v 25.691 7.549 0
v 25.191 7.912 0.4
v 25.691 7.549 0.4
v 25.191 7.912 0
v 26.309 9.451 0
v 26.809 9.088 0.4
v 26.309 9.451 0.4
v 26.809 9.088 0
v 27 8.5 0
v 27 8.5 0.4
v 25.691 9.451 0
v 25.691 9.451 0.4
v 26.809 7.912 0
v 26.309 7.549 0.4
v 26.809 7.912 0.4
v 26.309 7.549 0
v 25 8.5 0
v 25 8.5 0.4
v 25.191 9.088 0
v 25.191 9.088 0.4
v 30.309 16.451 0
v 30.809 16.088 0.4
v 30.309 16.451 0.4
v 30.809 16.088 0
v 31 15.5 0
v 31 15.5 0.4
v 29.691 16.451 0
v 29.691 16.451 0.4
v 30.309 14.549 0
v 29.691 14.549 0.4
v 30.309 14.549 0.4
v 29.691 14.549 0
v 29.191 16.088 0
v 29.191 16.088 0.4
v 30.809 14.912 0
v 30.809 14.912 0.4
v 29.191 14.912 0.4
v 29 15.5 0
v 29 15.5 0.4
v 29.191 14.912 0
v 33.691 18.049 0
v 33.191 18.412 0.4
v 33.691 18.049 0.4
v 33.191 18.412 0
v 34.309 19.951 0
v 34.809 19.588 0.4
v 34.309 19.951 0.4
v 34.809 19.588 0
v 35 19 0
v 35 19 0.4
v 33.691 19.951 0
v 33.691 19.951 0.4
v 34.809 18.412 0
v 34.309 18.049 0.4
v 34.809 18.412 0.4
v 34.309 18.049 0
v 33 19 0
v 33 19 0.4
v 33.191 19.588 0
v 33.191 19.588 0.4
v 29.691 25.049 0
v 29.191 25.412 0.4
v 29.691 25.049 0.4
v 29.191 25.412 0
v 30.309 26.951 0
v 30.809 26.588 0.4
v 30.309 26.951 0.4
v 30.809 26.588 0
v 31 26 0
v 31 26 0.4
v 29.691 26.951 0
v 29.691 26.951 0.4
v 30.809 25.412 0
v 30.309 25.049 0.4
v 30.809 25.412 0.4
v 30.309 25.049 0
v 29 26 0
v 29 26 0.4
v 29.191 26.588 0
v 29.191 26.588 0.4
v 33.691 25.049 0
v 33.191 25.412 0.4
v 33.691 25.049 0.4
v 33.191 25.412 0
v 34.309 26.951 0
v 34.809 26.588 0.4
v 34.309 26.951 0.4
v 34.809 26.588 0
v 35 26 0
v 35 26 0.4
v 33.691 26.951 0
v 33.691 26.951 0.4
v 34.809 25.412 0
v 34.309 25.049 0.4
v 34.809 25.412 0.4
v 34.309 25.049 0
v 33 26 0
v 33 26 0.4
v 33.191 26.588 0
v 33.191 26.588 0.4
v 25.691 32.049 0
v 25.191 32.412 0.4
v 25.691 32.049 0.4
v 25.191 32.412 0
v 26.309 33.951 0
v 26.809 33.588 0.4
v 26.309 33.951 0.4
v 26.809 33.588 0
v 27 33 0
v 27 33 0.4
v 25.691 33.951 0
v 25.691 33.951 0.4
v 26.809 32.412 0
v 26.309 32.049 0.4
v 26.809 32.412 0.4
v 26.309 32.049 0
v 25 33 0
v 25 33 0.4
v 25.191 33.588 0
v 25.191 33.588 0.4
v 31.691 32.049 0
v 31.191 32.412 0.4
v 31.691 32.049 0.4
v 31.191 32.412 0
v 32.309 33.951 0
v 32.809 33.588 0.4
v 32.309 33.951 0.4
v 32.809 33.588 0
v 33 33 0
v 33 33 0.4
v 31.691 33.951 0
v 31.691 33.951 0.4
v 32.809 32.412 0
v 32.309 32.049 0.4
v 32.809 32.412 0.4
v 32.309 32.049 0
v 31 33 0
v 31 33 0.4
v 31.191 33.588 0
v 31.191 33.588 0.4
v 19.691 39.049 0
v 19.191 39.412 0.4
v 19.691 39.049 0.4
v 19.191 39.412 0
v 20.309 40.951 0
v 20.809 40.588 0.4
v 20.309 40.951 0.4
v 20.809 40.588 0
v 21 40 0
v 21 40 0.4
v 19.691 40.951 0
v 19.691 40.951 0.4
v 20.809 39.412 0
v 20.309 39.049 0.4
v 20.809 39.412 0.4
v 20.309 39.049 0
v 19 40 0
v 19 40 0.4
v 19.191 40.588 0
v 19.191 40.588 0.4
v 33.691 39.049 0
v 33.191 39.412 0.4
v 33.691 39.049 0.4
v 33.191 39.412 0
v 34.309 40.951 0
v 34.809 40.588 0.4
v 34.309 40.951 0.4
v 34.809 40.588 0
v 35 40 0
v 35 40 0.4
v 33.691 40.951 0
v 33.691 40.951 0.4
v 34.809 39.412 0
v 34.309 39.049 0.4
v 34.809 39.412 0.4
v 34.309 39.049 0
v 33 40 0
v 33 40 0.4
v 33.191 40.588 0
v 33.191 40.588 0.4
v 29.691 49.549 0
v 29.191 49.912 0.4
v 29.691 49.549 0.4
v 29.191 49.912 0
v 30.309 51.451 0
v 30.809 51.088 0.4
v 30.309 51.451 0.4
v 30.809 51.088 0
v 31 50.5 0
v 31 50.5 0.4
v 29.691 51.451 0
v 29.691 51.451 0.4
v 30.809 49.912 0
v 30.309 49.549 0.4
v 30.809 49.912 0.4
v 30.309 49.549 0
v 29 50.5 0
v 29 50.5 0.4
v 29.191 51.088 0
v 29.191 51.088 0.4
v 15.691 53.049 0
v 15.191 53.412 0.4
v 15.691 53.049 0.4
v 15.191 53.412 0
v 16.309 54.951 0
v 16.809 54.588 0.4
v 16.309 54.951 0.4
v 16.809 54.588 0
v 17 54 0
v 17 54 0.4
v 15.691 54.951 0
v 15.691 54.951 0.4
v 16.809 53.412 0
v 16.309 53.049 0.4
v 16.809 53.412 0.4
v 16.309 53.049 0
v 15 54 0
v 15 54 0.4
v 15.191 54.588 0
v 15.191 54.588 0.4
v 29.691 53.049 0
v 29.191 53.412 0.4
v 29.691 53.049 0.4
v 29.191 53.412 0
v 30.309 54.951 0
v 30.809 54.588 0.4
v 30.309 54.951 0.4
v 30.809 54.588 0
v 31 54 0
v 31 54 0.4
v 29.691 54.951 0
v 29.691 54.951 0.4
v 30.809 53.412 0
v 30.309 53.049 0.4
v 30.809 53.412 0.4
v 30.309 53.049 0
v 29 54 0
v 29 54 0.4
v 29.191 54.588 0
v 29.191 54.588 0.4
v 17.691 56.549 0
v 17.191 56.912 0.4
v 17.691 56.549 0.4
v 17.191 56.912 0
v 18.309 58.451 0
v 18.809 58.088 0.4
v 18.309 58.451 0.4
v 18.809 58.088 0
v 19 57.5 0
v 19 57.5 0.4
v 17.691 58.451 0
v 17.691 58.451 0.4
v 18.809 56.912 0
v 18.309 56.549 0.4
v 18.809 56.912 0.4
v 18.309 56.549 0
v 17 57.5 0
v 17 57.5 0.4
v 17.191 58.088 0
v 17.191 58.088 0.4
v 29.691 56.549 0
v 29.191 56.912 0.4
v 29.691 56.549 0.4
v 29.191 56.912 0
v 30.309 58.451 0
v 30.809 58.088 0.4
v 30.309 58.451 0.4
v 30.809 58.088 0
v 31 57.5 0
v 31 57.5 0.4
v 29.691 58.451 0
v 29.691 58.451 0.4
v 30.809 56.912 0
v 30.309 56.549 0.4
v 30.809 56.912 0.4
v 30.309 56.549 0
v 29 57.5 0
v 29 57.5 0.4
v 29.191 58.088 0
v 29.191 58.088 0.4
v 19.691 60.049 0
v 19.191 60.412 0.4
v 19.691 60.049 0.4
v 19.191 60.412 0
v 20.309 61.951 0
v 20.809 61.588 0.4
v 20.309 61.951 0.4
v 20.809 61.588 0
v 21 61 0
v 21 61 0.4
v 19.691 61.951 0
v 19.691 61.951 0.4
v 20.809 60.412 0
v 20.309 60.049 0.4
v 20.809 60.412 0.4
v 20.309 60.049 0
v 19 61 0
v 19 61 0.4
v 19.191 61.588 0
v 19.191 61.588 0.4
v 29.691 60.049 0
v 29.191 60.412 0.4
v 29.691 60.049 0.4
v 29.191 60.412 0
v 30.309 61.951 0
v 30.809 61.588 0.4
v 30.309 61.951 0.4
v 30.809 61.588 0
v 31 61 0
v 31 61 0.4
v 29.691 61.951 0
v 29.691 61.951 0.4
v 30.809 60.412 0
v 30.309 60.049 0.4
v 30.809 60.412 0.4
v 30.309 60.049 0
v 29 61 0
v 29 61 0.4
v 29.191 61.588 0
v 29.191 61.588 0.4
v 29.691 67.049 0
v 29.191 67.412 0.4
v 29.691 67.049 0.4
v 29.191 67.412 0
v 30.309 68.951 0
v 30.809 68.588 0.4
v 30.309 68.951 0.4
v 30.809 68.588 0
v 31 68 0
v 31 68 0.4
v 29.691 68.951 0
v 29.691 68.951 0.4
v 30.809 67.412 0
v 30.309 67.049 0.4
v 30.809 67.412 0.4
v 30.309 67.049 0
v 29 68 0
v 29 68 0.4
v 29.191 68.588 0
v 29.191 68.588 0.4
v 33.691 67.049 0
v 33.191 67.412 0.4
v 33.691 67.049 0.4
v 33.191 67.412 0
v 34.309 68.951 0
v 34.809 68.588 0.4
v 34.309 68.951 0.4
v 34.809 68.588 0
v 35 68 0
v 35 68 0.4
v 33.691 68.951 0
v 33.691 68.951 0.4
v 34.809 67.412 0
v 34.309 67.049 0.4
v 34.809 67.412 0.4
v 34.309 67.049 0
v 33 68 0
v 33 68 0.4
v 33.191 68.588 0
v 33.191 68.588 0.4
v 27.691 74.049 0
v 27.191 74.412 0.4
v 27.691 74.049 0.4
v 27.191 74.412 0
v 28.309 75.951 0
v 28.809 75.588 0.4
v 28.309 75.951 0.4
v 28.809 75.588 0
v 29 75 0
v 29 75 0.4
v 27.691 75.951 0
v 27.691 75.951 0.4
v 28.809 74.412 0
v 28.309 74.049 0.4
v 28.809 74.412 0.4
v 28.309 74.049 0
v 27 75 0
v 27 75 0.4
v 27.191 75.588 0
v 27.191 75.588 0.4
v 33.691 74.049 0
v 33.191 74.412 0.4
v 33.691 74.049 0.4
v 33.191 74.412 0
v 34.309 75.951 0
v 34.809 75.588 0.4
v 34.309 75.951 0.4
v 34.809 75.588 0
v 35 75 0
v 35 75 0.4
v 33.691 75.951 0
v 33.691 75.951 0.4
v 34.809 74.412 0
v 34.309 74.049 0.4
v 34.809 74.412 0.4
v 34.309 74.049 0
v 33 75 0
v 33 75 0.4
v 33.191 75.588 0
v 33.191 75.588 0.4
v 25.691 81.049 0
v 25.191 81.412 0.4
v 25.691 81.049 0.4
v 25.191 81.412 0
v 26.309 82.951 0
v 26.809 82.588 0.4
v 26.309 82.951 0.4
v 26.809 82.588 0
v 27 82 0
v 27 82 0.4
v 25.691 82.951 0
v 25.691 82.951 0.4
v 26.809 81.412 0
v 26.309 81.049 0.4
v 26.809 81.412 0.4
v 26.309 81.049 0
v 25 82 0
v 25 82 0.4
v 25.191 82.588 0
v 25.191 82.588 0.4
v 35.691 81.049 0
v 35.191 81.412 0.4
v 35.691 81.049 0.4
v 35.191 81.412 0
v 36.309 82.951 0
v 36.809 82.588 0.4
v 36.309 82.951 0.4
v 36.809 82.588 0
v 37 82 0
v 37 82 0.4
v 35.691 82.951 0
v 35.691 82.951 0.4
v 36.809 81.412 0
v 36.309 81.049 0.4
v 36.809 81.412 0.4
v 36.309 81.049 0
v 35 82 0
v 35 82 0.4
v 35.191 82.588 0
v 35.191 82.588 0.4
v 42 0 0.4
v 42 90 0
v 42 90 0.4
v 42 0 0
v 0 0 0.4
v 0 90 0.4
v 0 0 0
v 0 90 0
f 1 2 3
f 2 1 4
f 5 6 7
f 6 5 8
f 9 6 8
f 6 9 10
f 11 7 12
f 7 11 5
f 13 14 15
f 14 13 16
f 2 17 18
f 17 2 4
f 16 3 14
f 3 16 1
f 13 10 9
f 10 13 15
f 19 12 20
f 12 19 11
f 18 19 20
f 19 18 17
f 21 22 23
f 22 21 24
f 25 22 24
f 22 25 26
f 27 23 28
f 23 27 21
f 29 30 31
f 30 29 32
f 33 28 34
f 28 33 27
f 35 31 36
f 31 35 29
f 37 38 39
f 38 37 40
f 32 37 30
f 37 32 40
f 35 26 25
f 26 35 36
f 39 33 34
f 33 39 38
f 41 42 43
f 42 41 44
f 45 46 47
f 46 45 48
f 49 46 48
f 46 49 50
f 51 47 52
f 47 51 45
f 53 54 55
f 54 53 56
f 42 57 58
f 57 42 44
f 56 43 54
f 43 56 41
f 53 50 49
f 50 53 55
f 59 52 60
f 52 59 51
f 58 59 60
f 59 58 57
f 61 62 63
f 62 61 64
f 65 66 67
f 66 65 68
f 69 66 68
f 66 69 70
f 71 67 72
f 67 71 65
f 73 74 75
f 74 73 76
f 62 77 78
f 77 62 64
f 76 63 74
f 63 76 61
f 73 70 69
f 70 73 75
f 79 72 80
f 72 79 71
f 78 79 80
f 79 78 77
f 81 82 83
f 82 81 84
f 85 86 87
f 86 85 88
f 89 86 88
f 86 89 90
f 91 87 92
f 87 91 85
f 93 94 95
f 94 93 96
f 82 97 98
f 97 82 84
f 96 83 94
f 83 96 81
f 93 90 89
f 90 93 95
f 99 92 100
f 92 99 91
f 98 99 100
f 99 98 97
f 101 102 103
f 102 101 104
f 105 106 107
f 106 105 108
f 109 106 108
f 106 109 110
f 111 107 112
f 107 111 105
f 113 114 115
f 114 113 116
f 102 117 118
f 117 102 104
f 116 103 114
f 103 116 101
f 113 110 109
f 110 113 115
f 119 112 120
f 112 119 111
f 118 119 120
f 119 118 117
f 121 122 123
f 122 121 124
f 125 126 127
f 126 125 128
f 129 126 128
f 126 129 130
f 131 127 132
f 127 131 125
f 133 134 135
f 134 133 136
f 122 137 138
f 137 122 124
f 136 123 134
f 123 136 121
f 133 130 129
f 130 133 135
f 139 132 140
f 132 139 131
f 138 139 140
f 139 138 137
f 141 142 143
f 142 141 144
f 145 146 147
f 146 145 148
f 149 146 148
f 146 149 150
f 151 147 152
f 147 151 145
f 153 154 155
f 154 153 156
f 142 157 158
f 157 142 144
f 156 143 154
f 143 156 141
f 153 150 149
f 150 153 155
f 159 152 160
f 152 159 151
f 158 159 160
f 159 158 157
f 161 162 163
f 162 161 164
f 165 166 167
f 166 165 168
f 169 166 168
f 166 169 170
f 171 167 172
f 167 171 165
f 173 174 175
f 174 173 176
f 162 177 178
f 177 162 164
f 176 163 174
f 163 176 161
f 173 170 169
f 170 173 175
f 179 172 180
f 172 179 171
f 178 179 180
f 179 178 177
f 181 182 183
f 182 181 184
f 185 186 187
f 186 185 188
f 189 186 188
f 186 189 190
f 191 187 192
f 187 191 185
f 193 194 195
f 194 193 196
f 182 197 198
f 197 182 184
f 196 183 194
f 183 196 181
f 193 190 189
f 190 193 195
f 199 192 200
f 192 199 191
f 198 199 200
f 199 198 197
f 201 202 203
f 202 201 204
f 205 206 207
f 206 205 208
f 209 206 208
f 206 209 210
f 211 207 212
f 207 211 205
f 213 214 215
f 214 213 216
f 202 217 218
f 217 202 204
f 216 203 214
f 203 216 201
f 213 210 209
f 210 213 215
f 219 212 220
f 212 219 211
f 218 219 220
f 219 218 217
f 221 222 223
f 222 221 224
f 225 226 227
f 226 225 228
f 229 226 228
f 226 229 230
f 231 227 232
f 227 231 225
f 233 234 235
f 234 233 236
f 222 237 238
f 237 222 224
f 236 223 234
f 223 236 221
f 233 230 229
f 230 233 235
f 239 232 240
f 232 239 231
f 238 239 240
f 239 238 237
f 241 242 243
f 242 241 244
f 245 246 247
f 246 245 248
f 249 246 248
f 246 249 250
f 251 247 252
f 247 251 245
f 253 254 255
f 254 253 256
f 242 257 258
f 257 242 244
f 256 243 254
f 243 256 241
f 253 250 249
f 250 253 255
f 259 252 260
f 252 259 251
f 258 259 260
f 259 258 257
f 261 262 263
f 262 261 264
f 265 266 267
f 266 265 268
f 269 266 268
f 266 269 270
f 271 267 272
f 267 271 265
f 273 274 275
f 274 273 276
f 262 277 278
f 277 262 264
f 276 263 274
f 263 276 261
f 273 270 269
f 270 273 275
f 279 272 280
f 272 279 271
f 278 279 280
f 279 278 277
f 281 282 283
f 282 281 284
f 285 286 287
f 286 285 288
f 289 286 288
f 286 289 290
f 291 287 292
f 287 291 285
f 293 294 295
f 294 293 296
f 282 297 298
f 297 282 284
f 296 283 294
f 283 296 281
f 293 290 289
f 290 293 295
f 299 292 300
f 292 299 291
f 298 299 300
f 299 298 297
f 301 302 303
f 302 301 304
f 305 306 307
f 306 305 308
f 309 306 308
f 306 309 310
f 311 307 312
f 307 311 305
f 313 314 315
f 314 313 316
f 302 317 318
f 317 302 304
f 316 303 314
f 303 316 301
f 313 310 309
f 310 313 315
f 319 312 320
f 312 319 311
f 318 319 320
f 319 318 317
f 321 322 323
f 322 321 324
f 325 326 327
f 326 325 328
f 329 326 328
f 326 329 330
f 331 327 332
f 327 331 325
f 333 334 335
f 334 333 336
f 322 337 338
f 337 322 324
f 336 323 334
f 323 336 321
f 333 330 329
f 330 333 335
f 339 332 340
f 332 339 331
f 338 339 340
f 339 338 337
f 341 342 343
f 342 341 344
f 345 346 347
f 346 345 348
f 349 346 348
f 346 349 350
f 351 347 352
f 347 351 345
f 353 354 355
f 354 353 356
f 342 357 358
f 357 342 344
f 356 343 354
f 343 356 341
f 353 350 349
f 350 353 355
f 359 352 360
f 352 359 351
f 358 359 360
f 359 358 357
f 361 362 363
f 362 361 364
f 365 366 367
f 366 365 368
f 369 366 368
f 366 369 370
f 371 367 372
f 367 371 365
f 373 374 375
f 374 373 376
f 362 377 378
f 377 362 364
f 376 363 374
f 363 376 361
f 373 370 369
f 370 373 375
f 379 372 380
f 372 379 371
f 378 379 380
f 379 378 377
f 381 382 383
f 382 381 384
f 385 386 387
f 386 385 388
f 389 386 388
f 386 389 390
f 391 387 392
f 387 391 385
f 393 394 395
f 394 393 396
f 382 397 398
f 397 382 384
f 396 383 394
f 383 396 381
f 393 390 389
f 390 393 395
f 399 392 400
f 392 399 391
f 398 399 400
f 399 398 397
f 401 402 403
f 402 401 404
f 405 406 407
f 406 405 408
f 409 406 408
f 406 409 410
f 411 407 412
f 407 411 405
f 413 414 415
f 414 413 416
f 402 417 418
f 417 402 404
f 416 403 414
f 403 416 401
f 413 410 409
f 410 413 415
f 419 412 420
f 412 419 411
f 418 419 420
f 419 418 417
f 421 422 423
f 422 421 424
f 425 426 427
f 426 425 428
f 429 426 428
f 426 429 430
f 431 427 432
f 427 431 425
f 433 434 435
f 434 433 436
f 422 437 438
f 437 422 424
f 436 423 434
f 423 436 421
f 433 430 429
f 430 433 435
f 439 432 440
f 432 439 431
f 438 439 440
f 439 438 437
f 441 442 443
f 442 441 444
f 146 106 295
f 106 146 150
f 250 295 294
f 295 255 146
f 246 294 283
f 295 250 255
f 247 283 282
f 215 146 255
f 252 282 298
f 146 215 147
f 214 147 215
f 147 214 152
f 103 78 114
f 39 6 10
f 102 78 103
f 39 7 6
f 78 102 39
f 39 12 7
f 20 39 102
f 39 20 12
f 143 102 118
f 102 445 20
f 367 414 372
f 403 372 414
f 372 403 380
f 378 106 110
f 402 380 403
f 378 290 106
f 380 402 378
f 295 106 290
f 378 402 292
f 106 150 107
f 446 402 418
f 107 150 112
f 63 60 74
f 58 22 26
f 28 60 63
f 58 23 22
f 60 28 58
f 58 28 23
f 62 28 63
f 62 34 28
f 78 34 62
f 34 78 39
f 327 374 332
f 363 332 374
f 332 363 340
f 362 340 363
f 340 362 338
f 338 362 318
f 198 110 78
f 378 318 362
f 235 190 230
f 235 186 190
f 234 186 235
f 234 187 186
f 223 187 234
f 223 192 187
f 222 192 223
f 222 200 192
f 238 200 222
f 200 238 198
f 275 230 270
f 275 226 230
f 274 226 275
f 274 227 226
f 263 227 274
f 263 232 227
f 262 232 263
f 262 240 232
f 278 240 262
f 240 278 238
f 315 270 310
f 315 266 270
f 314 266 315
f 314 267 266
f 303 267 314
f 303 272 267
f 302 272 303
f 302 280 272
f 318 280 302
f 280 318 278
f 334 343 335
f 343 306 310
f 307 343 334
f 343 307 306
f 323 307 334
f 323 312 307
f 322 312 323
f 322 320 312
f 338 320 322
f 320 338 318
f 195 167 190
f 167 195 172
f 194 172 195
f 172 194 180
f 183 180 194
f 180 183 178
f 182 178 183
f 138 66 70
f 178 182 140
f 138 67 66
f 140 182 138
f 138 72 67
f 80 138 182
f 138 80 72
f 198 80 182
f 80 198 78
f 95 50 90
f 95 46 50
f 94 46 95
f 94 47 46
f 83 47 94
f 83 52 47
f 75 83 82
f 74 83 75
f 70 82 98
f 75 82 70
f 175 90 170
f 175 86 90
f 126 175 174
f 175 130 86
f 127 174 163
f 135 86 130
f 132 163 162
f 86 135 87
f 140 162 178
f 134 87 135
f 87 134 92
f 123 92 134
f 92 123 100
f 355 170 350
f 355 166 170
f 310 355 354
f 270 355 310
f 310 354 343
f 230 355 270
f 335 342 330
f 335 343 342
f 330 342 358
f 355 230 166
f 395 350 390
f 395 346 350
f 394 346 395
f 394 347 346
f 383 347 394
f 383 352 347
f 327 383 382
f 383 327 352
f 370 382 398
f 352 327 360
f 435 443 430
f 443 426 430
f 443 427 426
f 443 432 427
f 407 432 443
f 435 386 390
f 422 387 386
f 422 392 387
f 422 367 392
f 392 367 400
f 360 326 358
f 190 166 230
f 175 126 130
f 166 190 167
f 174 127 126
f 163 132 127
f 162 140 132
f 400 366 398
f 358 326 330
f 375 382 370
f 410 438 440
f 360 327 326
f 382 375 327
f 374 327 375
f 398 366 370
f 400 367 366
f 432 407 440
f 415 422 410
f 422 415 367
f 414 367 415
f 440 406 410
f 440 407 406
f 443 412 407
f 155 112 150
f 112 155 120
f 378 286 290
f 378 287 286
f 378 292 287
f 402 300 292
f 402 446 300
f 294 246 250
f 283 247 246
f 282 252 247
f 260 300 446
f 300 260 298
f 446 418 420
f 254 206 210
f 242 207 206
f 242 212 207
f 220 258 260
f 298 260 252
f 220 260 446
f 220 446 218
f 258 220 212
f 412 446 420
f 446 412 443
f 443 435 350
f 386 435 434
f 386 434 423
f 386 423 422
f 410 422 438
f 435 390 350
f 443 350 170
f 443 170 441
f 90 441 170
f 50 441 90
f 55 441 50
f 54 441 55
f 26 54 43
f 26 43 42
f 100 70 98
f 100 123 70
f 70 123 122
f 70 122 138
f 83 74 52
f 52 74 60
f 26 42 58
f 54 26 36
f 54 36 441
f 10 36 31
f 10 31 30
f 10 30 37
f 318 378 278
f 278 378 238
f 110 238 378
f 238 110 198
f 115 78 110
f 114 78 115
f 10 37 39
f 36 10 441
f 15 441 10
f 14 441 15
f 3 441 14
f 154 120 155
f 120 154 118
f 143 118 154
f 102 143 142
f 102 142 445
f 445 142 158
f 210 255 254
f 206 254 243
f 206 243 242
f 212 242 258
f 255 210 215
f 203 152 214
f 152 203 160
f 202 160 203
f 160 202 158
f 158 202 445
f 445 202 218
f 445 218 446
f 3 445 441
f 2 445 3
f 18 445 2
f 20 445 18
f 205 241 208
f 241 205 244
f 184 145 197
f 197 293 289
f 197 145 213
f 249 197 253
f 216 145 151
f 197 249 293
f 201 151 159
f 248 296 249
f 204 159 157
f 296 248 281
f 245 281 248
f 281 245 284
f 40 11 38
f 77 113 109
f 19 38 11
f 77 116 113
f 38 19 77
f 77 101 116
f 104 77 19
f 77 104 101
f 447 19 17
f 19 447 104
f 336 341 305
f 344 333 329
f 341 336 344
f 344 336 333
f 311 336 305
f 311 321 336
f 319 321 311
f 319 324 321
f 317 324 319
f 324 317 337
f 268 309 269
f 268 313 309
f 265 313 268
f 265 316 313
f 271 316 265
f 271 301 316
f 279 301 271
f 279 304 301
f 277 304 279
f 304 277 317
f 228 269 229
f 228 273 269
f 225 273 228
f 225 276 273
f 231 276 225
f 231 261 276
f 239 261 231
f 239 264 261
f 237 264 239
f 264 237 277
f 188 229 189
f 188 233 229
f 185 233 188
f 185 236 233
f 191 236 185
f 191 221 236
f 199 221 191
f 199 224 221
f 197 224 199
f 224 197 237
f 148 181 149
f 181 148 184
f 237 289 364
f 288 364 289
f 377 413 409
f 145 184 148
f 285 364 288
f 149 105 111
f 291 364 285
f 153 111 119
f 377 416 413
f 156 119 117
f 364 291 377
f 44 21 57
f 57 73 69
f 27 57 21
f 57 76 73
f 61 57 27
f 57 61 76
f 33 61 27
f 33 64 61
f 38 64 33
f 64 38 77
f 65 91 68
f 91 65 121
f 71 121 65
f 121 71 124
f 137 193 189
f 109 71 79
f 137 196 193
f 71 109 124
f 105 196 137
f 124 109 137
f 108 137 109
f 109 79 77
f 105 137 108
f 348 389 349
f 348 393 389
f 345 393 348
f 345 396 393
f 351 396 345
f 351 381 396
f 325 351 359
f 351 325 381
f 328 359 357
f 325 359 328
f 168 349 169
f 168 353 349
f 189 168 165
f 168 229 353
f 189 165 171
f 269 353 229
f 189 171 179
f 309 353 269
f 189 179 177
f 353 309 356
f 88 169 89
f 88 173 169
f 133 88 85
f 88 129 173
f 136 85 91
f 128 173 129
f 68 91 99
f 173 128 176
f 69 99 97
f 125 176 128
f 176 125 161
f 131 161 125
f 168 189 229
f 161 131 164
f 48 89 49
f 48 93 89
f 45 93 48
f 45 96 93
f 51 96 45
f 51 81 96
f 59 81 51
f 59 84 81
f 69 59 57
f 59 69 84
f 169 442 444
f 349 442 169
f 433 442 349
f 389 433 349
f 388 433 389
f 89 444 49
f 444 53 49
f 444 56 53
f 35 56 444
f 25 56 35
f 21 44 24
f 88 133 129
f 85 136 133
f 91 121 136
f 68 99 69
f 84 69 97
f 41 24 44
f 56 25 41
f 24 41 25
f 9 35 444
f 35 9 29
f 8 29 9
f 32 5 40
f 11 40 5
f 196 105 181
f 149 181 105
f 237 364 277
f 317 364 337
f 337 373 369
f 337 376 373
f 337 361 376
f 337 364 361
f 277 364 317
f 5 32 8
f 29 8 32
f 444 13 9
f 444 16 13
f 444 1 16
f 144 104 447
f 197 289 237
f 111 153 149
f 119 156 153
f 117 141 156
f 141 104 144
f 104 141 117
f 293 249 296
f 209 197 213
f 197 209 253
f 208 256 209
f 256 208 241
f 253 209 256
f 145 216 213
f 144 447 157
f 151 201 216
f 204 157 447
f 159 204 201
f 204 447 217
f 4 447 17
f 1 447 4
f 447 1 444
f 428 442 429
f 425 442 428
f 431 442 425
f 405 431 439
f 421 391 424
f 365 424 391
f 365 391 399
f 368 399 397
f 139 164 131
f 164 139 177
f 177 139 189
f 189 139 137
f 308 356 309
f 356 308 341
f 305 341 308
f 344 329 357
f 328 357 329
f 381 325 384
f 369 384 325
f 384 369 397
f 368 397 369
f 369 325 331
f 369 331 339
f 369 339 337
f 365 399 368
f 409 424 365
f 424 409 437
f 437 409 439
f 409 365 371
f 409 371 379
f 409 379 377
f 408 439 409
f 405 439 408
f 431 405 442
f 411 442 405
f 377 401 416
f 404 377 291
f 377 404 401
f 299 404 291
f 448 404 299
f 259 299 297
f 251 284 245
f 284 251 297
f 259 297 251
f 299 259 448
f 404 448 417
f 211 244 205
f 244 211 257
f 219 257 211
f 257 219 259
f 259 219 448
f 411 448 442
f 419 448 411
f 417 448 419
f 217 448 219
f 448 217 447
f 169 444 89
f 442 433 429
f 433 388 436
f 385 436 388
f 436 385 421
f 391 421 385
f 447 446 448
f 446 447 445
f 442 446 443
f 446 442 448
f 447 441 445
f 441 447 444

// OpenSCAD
$fn=10*1;  //More polygons

//Defines whether a pre-defined song or the NoteString shall be used.
SongPicker = "Star-Spangled Banner"; // [Note-String,Star-Spangled Banner]

//Defines where to set the holes for the notes. You have the notes c1 to c3. The first two characters define the note (c1,d1,e1...b1,c2,...c3), the last two characters define the beat. You have 50 beats to use. After every note-definition place a |. One c1 on the third beat would result in this NoteString: "c103|". Don't forget the | at the end!
NoteString = "c101|d102|e103|f104|g105|a106|b107|c208|d209|e210|f211|g212|a213|b214|c315|";

//The layer-thickness must not be more then 0.4mm. Otherwise it won't fit into the music box! Also try to print at least two layers - so slice it with a layer height of 0.2mm.
LayerThickness = 0.4;

//Defines the width of the stripe (in mm).
StripeWidth = 42; // [30:50]

//Defines the length of the stripe. 15 beats need a length around 60mm. The full 50 beats would need 200mm.
StripeLength = 90;// [10:200]

//For fine-tuning only: defines how far the c1 is away from the left stripe-border (in mm).
MarginLeft = 5; // [2:10]

//For fine-tuning only: defines the distance between the beats.
BeatDistance = 3.5;

//For fine-tuning only: defines the distance between the beats.
ToneDistance = 2;

Start( );

module Start()
{
NoteString_AmericanAnthem = "a101|f103|d104|f106|d106|a108|e108|d210|d110|f113|f214|f114|e215|f115|d216|f116|f118|d118|g120|d120|a122|c122|";

if( SongPicker == "Star-Spangled Banner")
	BuildStripe(NoteString_AmericanAnthem);
else if (SongPicker == "Note-String")
	BuildStripe(NoteString);
}

module BuildStripe(NoteStringLocal){
	takte=search("|",NoteStringLocal,1000)[0];
	difference()
	{
		BuildBase();
		for(i=[0:len(takte)-1])
		{
			printNote(str(NoteStringLocal[takte[i]-2],NoteStringLocal[takte[i]-1]), str(NoteStringLocal[takte[i]-4],NoteStringLocal[takte[i]-3]));
		}
	}
}

module printNote(takt,note)
{
	//I did not find a way to convert the string "01" into the number 1.
	//So there is this ugly convertion, I'm sorry. ;)
	if (takt == "01")
		printNote2(1,note);
	else if (takt == "02")
		printNote2(2,note);
	else if (takt == "03")
		printNote2(3,note);
	else if (takt == "04")
		printNote2(4,note);
	else if (takt == "05")
		printNote2(5,note);
	else if (takt == "06")
		printNote2(6,note);
	else if (takt == "07")
		printNote2(7,note);
	else if (takt == "08")
		printNote2(8,note);
	else if (takt == "09")
		printNote2(9,note);
	else if (takt == "10")
		printNote2(10,note);
	else if (takt == "11")
		printNote2(11,note);
	else if (takt == "12")
		printNote2(12,note);
	else if (takt == "13")
		printNote2(13,note);
	else if (takt == "14")
		printNote2(14,note);
	else if (takt == "15")
		printNote2(15,note);
	else if (takt == "16")
		printNote2(16,note);
	else if (takt == "17")
		printNote2(17,note);
	else if (takt == "18")
		printNote2(18,note);
	else if (takt == "19")
		printNote2(19,note);
	else if (takt == "20")
		printNote2(20,note);
	else if (takt == "21")
		printNote2(21,note);
	else if (takt == "22")
		printNote2(22,note);
	else if (takt == "23")
		printNote2(23,note);
	else if (takt == "24")
		printNote2(24,note);
	else if (takt == "25")
		printNote2(25,note);
	else if (takt == "26")
		printNote2(26,note);
	else if (takt == "27")
		printNote2(27,note);
	else if (takt == "28")
		printNote2(28,note);
	else if (takt == "29")
		printNote2(29,note);
	else if (takt == "30")
		printNote2(30,note);
	else if (takt == "31")
		printNote2(31,note);
	else if (takt == "32")
		printNote2(32,note);
	else if (takt == "33")
		printNote2(33,note);
	else if (takt == "34")
		printNote2(34,note);
	else if (takt == "35")
		printNote2(35,note);
	else if (takt == "36")
		printNote2(36,note);
	else if (takt == "37")
		printNote2(37,note);
	else if (takt == "38")
		printNote2(38,note);
	else if (takt == "39")
		printNote2(39,note);
	else if (takt == "40")
		printNote2(40,note);
	else if (takt == "41")
		printNote2(41,note);
	else if (takt == "42")
		printNote2(42,note);
	else if (takt == "43")
		printNote2(43,note);
	else if (takt == "44")
		printNote2(44,note);
	else if (takt == "45")
		printNote2(45,note);
	else if (takt == "46")
		printNote2(46,note);
	else if (takt == "47")
		printNote2(47,note);
	else if (takt == "48")
		printNote2(48,note);
	else if (takt == "49")
		printNote2(49,note);
	else if (takt == "50")
		printNote2(50,note);
	else
		printNote2(10,note);
}

module printNote2(takt,note)
{
	if (note == "c1")
		MakeHole(takt,1);
	else if (note == "d1")
		MakeHole(takt,2);
	else if (note == "e1")
		MakeHole(takt,3);
	else if (note == "f1")
		MakeHole(takt,4);
	else if (note == "g1")
		MakeHole(takt,5);
	else if (note == "a1")
		MakeHole(takt,6);
	else if (note == "b1") //h
		MakeHole(takt,7);
	else if (note == "c2")
		MakeHole(takt,8);
	else if (note == "d2")
		MakeHole(takt,9);
	else if (note == "e2")
		MakeHole(takt,10);
	else if (note == "f2")
		MakeHole(takt,11);
	else if (note == "g2")
		MakeHole(takt,12);
	else if (note == "a2")
		MakeHole(takt,13);
	else if (note == "b2") //h
		MakeHole(takt,14);
	else if (note == "c3")
		MakeHole(takt,15);
}

module BuildBase(){
	cube([StripeWidth,StripeLength,LayerThickness]);
}

module MakeHole(beatNumber,pitchNumber){
	Y = MarginLeft + (beatNumber * BeatDistance);
	X = StripeWidth - MarginLeft - (pitchNumber * ToneDistance) + 1;

	translate([X,Y,-1]) cylinder(h=LayerThickness*20,r=1);
}
